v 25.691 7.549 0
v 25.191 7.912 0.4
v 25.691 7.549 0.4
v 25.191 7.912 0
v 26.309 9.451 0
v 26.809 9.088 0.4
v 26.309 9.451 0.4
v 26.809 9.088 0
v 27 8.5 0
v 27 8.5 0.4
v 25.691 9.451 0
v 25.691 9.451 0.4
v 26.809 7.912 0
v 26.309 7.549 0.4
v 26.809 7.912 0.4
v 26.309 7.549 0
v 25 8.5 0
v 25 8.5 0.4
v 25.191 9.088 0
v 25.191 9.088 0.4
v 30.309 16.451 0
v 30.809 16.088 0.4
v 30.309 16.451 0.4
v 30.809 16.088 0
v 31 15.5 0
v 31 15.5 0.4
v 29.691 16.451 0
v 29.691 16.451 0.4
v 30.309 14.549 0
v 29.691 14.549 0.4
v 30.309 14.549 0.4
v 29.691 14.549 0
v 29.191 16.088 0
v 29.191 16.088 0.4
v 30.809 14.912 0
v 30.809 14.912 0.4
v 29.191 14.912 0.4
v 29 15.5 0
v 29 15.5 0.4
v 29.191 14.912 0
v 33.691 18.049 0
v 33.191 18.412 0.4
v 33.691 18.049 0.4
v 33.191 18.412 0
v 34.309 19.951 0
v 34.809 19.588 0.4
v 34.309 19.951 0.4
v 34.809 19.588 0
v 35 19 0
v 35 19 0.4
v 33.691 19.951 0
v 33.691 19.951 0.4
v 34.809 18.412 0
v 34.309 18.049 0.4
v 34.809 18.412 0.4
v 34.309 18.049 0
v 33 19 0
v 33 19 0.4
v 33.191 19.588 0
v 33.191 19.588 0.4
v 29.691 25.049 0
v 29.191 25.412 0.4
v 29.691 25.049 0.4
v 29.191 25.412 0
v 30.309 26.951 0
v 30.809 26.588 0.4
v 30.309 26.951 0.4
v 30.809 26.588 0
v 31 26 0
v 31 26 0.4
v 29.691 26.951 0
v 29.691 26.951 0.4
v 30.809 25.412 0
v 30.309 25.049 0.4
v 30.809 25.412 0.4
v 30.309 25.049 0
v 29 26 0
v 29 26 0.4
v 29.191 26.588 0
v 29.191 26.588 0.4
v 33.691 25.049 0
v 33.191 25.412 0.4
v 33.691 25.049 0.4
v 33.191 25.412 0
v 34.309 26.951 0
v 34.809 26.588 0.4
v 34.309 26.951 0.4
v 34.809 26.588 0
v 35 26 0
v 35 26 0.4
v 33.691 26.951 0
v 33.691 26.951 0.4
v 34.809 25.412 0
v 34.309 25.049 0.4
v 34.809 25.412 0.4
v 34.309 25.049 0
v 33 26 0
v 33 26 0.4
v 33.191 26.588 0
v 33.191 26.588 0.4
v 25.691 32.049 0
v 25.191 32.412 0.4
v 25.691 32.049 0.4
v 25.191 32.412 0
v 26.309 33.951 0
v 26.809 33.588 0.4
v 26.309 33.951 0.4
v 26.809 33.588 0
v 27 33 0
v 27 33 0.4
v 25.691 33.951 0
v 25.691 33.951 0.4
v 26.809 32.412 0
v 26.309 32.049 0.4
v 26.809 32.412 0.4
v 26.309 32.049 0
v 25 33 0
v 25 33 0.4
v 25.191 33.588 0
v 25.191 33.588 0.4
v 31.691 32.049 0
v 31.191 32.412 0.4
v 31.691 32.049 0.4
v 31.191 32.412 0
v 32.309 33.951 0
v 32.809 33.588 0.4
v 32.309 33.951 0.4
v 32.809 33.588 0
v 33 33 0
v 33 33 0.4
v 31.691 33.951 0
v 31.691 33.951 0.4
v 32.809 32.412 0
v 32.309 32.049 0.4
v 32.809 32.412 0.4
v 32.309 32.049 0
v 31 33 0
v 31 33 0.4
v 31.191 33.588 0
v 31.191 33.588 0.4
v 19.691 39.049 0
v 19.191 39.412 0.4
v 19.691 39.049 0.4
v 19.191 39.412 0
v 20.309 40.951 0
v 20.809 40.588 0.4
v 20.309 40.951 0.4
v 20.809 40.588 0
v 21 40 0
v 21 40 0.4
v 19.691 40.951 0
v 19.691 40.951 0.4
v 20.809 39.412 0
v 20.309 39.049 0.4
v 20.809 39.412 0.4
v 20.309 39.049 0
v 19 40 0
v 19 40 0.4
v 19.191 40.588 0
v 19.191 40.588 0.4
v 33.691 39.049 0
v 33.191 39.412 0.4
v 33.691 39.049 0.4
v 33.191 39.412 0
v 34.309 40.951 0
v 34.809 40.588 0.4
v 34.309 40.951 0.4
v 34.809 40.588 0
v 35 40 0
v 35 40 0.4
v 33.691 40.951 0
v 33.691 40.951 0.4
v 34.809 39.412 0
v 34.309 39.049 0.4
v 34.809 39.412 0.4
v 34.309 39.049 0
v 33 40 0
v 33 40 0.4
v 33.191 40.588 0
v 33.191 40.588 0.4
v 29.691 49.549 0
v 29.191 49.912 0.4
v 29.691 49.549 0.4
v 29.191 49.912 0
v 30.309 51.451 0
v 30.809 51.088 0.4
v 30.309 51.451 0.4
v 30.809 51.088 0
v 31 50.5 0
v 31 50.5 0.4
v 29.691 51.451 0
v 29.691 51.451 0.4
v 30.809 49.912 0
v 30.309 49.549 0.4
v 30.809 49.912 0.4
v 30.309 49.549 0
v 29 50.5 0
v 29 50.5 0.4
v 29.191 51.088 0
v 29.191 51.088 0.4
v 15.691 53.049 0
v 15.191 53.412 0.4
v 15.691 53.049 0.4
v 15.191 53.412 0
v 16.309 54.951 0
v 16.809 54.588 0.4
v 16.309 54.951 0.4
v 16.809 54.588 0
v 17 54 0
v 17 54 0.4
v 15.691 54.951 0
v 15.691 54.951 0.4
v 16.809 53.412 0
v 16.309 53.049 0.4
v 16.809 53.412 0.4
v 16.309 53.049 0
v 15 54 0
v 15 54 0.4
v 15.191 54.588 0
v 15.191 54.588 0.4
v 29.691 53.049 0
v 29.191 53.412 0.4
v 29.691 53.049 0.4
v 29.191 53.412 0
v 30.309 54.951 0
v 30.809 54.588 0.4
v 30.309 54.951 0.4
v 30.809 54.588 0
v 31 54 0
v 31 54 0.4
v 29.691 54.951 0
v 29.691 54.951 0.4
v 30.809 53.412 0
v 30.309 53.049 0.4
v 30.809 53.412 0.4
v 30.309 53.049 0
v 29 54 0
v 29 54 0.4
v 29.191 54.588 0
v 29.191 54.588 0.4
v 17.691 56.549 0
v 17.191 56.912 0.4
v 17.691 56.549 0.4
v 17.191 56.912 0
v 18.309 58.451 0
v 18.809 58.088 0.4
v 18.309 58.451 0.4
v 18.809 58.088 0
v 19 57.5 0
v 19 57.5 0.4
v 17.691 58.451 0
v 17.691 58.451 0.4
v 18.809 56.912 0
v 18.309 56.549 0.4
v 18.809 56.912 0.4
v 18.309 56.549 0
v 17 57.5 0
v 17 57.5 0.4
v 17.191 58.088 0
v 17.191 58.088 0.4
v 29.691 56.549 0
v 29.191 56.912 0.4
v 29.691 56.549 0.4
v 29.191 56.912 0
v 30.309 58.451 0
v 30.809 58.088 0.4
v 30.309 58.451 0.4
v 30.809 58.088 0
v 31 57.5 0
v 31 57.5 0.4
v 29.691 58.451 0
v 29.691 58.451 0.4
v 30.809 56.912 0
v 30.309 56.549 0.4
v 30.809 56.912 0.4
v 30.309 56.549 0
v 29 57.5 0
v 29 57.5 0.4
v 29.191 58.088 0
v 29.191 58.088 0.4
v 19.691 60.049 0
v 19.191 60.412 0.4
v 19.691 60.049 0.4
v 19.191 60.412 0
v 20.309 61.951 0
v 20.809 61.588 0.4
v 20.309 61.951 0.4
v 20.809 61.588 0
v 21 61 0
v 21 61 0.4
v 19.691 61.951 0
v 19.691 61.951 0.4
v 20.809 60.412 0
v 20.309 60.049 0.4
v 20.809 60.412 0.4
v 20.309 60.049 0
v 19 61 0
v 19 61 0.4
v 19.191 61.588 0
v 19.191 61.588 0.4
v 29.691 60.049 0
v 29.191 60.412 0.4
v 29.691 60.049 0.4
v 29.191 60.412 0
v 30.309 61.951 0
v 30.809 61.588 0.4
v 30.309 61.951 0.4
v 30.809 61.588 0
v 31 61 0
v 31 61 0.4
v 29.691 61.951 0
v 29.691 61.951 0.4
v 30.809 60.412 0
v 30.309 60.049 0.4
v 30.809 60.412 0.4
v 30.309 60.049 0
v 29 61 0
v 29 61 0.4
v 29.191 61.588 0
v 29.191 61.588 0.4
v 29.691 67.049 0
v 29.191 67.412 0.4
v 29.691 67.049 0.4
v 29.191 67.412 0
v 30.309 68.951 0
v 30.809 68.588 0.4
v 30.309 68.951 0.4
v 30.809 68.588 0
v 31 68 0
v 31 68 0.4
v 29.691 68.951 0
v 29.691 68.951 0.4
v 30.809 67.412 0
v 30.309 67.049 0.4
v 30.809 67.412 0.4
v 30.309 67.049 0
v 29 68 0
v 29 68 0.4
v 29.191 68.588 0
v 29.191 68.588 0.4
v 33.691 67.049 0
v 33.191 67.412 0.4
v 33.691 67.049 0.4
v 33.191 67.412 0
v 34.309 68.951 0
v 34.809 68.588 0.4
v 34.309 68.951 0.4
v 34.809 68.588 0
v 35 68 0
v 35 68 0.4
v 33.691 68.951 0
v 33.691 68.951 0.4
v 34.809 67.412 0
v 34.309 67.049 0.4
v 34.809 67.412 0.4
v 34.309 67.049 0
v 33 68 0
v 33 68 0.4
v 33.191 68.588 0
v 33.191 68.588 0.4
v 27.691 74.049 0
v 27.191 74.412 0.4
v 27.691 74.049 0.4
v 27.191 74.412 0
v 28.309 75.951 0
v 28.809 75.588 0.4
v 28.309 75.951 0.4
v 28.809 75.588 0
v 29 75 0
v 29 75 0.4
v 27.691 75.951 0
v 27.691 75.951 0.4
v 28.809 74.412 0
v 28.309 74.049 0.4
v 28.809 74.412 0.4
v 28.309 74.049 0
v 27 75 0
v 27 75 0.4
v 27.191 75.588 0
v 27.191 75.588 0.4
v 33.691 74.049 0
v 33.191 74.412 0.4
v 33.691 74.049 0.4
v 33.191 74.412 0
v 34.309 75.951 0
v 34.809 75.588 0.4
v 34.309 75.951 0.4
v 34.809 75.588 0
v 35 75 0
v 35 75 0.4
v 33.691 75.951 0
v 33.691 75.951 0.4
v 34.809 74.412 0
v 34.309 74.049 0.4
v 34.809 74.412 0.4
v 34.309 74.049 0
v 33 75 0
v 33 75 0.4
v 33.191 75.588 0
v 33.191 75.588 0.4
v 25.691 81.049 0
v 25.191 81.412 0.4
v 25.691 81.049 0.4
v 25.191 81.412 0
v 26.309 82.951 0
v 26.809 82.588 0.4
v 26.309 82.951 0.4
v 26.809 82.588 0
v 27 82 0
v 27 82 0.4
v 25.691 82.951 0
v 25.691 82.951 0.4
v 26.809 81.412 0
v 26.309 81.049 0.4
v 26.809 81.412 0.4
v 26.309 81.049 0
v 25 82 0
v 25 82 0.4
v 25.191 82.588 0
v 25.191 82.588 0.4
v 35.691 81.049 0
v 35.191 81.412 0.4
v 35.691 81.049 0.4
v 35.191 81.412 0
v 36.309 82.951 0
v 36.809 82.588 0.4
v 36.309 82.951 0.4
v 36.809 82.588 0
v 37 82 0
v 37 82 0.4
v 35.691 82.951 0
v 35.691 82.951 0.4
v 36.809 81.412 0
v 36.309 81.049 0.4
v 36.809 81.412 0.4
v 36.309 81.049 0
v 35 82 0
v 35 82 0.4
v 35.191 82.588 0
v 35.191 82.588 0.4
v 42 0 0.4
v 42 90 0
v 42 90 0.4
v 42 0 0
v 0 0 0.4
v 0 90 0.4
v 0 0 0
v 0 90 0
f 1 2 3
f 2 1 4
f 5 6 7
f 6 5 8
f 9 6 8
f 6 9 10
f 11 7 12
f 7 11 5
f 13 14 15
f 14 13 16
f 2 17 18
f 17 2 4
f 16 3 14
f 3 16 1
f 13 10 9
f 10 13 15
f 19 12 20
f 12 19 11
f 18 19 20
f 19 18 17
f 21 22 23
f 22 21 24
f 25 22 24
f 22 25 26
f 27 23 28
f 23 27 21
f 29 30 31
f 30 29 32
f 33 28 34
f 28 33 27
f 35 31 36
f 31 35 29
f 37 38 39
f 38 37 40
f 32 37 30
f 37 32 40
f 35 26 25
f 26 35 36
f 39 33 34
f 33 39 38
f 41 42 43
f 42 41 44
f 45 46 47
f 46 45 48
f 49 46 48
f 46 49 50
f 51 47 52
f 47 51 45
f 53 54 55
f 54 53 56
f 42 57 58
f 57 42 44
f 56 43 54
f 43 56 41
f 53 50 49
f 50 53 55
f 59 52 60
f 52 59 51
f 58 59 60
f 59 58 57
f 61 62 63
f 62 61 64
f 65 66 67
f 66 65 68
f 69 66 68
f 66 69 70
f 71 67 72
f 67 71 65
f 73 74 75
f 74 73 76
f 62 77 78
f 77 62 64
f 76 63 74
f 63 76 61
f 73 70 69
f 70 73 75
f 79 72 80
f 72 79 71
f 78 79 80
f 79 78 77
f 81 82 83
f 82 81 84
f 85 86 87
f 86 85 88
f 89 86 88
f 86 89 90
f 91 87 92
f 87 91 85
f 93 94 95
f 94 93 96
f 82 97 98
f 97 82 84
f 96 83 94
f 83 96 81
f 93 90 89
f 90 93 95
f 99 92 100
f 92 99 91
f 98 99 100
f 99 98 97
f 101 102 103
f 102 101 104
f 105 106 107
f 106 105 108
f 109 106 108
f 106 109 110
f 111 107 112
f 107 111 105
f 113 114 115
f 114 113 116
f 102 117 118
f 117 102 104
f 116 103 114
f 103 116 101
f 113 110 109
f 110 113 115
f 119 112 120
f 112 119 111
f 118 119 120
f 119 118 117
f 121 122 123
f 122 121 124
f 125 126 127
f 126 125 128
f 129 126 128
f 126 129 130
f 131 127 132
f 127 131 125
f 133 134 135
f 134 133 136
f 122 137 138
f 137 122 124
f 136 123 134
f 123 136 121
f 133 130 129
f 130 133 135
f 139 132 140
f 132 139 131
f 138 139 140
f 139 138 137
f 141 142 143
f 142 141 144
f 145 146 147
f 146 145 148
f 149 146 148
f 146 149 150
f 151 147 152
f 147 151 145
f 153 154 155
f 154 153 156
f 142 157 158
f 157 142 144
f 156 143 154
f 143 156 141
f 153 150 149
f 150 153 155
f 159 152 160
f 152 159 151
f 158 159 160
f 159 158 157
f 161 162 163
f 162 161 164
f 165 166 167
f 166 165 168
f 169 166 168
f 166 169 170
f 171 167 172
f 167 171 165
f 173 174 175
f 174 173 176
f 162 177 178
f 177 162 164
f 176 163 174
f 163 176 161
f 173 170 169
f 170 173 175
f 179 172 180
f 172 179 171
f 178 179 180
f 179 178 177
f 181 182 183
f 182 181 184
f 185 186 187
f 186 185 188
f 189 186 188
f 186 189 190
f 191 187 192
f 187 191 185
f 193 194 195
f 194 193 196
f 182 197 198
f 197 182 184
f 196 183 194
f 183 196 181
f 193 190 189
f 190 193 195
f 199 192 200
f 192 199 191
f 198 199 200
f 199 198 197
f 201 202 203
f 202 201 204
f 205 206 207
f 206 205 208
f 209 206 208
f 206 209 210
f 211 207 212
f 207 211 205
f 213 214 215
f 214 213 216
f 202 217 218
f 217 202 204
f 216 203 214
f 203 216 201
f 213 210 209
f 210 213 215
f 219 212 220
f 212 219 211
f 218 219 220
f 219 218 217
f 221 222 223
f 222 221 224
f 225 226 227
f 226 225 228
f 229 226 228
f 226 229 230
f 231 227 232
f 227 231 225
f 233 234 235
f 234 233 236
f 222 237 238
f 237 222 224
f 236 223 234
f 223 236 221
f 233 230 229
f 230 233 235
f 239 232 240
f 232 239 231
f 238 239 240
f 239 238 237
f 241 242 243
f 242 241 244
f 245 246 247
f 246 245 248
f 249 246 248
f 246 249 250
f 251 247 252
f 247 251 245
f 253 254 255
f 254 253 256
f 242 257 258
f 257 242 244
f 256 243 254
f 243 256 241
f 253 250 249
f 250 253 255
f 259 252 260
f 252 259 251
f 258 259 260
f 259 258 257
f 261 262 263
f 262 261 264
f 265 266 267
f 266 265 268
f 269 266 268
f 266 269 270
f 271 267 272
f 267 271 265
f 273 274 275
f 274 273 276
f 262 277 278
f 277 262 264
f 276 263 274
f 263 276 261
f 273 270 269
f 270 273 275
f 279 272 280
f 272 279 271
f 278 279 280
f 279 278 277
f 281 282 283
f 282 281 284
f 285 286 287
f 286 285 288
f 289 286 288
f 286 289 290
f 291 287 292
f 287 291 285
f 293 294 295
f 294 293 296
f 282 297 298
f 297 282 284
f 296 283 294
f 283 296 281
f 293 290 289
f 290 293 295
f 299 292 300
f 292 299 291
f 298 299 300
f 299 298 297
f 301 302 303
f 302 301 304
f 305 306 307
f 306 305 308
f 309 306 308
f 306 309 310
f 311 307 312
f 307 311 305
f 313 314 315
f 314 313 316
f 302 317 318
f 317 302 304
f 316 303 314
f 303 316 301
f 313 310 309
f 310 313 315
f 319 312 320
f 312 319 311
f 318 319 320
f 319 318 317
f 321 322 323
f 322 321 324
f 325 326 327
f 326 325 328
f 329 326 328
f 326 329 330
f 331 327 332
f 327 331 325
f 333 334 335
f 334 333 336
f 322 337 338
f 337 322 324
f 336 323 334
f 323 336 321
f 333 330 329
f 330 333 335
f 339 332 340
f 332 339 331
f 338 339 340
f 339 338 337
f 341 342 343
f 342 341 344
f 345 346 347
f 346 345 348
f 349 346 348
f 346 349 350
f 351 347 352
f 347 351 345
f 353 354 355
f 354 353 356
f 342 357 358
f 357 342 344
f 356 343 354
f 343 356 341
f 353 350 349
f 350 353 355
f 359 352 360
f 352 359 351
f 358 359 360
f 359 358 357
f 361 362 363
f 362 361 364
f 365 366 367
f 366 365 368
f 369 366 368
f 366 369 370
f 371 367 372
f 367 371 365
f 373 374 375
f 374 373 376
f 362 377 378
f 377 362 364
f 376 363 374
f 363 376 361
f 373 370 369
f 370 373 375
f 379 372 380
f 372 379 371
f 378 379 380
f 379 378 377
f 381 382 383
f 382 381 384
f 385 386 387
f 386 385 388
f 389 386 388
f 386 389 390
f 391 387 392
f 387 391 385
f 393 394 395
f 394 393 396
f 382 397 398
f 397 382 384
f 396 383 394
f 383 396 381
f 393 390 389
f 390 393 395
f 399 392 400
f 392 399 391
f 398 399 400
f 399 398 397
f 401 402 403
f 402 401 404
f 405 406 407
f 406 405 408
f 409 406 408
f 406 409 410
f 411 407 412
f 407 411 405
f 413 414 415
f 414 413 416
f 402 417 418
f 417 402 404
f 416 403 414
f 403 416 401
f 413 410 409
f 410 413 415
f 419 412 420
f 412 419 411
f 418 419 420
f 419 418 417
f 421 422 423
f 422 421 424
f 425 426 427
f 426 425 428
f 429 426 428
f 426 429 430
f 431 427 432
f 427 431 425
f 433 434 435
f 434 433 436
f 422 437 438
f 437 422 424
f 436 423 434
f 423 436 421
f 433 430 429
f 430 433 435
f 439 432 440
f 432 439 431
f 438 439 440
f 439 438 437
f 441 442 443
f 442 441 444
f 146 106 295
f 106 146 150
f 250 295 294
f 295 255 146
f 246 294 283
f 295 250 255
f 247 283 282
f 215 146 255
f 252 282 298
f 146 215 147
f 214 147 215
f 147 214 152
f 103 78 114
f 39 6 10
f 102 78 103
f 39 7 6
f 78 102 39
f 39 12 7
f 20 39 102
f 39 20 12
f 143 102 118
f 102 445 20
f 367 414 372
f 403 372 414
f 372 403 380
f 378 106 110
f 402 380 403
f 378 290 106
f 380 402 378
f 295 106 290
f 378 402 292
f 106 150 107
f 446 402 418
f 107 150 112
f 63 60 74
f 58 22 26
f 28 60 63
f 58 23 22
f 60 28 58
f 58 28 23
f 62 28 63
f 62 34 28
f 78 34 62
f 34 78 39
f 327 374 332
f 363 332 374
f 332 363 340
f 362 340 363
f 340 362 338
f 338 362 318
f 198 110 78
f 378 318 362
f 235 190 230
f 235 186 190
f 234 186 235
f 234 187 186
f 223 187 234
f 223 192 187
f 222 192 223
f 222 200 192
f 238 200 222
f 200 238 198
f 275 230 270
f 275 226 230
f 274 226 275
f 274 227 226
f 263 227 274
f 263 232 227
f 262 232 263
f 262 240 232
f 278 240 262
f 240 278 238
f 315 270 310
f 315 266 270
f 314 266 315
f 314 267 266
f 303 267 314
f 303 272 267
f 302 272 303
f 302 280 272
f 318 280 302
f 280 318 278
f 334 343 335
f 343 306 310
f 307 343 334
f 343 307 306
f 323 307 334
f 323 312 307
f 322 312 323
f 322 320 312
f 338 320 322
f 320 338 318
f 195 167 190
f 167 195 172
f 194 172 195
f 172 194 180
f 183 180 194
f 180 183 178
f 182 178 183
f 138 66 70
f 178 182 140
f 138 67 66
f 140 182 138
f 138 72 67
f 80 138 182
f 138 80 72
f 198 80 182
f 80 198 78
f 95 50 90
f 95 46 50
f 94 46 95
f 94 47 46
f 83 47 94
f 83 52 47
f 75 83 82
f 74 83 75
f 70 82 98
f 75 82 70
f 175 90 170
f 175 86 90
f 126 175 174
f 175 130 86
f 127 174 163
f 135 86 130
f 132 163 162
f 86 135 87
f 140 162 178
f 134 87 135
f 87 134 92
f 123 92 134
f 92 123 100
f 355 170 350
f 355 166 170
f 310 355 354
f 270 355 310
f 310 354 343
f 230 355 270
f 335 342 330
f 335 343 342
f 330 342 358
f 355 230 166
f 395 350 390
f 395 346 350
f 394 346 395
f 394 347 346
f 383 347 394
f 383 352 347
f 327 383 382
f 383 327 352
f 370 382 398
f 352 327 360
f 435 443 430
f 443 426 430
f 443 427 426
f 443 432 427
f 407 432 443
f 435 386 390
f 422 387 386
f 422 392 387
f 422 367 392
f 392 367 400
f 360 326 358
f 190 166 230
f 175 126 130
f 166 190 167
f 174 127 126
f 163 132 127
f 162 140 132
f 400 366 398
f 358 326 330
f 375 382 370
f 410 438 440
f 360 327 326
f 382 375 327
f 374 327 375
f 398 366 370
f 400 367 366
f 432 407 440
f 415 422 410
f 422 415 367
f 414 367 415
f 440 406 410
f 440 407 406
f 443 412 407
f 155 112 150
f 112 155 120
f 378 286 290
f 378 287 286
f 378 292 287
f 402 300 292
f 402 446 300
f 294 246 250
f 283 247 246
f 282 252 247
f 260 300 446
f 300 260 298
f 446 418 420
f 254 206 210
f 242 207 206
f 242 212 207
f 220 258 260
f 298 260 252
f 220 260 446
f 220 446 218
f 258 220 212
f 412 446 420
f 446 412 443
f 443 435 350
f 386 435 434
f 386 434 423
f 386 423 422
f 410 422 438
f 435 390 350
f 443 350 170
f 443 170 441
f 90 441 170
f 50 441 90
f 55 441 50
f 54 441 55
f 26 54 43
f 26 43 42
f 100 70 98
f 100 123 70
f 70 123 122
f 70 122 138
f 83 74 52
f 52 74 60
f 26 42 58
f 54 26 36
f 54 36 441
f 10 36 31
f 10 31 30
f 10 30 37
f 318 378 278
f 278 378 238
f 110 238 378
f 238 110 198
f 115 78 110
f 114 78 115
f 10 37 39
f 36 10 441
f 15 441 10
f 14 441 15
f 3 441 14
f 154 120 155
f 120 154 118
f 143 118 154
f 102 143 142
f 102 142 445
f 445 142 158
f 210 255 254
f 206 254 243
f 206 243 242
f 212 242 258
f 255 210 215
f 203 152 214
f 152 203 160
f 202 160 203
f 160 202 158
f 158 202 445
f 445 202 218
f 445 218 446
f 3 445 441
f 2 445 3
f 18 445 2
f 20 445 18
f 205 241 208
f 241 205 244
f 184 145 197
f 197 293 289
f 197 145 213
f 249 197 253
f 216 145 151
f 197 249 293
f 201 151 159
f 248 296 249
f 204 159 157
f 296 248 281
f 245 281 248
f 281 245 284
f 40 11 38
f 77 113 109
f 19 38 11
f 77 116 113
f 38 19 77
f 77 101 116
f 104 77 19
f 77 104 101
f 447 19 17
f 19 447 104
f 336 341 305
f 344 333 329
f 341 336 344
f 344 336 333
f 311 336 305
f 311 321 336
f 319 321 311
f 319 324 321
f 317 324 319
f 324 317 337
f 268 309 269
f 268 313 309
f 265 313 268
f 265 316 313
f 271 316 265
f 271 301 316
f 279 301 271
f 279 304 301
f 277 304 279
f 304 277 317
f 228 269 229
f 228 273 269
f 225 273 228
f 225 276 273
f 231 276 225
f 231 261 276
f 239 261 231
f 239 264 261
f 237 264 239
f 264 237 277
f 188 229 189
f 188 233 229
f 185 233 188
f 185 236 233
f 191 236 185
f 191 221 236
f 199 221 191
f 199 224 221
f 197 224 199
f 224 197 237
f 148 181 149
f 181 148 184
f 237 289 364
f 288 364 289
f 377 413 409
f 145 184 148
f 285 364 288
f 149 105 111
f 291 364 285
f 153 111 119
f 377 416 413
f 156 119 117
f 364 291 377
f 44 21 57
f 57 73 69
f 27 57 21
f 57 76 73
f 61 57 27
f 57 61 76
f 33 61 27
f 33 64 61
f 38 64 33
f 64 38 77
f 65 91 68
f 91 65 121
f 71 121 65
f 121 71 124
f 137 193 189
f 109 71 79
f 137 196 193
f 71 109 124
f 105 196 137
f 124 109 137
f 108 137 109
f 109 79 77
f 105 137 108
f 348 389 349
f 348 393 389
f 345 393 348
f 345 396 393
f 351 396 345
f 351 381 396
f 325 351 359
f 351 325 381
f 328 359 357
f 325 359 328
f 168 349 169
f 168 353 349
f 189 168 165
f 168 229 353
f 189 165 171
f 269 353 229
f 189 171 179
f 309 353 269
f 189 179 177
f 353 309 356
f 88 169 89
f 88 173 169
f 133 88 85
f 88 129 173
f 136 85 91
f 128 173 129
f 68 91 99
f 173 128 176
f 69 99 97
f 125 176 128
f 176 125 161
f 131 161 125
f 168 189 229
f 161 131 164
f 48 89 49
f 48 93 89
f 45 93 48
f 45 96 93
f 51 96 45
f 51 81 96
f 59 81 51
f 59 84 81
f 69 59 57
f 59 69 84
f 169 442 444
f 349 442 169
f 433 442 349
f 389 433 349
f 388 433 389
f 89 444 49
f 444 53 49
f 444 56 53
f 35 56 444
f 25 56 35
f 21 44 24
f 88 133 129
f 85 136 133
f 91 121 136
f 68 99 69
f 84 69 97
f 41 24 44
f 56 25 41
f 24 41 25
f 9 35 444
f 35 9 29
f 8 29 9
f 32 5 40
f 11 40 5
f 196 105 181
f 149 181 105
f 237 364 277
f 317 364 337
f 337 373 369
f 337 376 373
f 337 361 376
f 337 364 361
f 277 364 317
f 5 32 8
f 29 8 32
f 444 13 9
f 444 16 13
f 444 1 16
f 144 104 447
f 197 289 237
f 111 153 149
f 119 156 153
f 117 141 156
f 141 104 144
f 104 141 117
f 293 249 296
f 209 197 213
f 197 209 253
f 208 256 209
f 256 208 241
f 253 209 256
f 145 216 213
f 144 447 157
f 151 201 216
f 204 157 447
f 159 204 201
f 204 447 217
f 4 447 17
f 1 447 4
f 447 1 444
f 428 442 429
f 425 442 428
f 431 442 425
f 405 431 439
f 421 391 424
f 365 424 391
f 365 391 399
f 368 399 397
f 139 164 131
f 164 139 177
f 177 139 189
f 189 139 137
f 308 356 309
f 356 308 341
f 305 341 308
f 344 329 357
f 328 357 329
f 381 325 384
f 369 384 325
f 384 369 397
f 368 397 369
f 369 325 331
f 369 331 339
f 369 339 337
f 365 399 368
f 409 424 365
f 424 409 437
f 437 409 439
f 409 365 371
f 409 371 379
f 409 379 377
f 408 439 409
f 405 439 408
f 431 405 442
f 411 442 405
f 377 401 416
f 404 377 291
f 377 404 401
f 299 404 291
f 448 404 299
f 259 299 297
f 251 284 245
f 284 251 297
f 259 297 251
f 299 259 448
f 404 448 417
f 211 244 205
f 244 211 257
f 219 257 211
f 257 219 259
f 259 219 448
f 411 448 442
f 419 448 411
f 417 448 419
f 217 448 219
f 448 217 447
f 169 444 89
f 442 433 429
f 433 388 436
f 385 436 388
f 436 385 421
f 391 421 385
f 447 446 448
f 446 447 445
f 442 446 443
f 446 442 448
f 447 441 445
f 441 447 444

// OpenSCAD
$fn=10*1;  //More polygons

//Defines whether a pre-defined song or the NoteString shall be used.
SongPicker = "Star-Spangled Banner"; // [Note-String,Star-Spangled Banner]

//Defines where to set the holes for the notes. You have the notes c1 to c3. The first two characters define the note (c1,d1,e1...b1,c2,...c3), the last two characters define the beat. You have 50 beats to use. After every note-definition place a |. One c1 on the third beat would result in this NoteString: "c103|". Don't forget the | at the end!
NoteString = "c101|d102|e103|f104|g105|a106|b107|c208|d209|e210|f211|g212|a213|b214|c315|";

//The layer-thickness must not be more then 0.4mm. Otherwise it won't fit into the music box! Also try to print at least two layers - so slice it with a layer height of 0.2mm.
LayerThickness = 0.4;

//Defines the width of the stripe (in mm).
StripeWidth = 42; // [30:50]

//Defines the length of the stripe. 15 beats need a length around 60mm. The full 50 beats would need 200mm.
StripeLength = 90;// [10:200]

//For fine-tuning only: defines how far the c1 is away from the left stripe-border (in mm).
MarginLeft = 5; // [2:10]

//For fine-tuning only: defines the distance between the beats.
BeatDistance = 3.5;

//For fine-tuning only: defines the distance between the beats.
ToneDistance = 2;

Start( );

module Start()
{
NoteString_AmericanAnthem = "a101|f103|d104|f106|d106|a108|e108|d210|d110|f113|f214|f114|e215|f115|d216|f116|f118|d118|g120|d120|a122|c122|";

if( SongPicker == "Star-Spangled Banner")
	BuildStripe(NoteString_AmericanAnthem);
else if (SongPicker == "Note-String")
	BuildStripe(NoteString);
}

module BuildStripe(NoteStringLocal){
	takte=search("|",NoteStringLocal,1000)[0];
	difference()
	{
		BuildBase();
		for(i=[0:len(takte)-1])
		{
			printNote(str(NoteStringLocal[takte[i]-2],NoteStringLocal[takte[i]-1]), str(NoteStringLocal[takte[i]-4],NoteStringLocal[takte[i]-3]));
		}
	}
}

module printNote(takt,note)
{
	//I did not find a way to convert the string "01" into the number 1.
	//So there is this ugly convertion, I'm sorry. ;)
	if (takt == "01")
		printNote2(1,note);
	else if (takt == "02")
		printNote2(2,note);
	else if (takt == "03")
		printNote2(3,note);
	else if (takt == "04")
		printNote2(4,note);
	else if (takt == "05")
		printNote2(5,note);
	else if (takt == "06")
		printNote2(6,note);
	else if (takt == "07")
		printNote2(7,note);
	else if (takt == "08")
		printNote2(8,note);
	else if (takt == "09")
		printNote2(9,note);
	else if (takt == "10")
		printNote2(10,note);
	else if (takt == "11")
		printNote2(11,note);
	else if (takt == "12")
		printNote2(12,note);
	else if (takt == "13")
		printNote2(13,note);
	else if (takt == "14")
		printNote2(14,note);
	else if (takt == "15")
		printNote2(15,note);
	else if (takt == "16")
		printNote2(16,note);
	else if (takt == "17")
		printNote2(17,note);
	else if (takt == "18")
		printNote2(18,note);
	else if (takt == "19")
		printNote2(19,note);
	else if (takt == "20")
		printNote2(20,note);
	else if (takt == "21")
		printNote2(21,note);
	else if (takt == "22")
		printNote2(22,note);
	else if (takt == "23")
		printNote2(23,note);
	else if (takt == "24")
		printNote2(24,note);
	else if (takt == "25")
		printNote2(25,note);
	else if (takt == "26")
		printNote2(26,note);
	else if (takt == "27")
		printNote2(27,note);
	else if (takt == "28")
		printNote2(28,note);
	else if (takt == "29")
		printNote2(29,note);
	else if (takt == "30")
		printNote2(30,note);
	else if (takt == "31")
		printNote2(31,note);
	else if (takt == "32")
		printNote2(32,note);
	else if (takt == "33")
		printNote2(33,note);
	else if (takt == "34")
		printNote2(34,note);
	else if (takt == "35")
		printNote2(35,note);
	else if (takt == "36")
		printNote2(36,note);
	else if (takt == "37")
		printNote2(37,note);
	else if (takt == "38")
		printNote2(38,note);
	else if (takt == "39")
		printNote2(39,note);
	else if (takt == "40")
		printNote2(40,note);
	else if (takt == "41")
		printNote2(41,note);
	else if (takt == "42")
		printNote2(42,note);
	else if (takt == "43")
		printNote2(43,note);
	else if (takt == "44")
		printNote2(44,note);
	else if (takt == "45")
		printNote2(45,note);
	else if (takt == "46")
		printNote2(46,note);
	else if (takt == "47")
		printNote2(47,note);
	else if (takt == "48")
		printNote2(48,note);
	else if (takt == "49")
		printNote2(49,note);
	else if (takt == "50")
		printNote2(50,note);
	else
		printNote2(10,note);
}

module printNote2(takt,note)
{
	if (note == "c1")
		MakeHole(takt,1);
	else if (note == "d1")
		MakeHole(takt,2);
	else if (note == "e1")
		MakeHole(takt,3);
	else if (note == "f1")
		MakeHole(takt,4);
	else if (note == "g1")
		MakeHole(takt,5);
	else if (note == "a1")
		MakeHole(takt,6);
	else if (note == "b1") //h
		MakeHole(takt,7);
	else if (note == "c2")
		MakeHole(takt,8);
	else if (note == "d2")
		MakeHole(takt,9);
	else if (note == "e2")
		MakeHole(takt,10);
	else if (note == "f2")
		MakeHole(takt,11);
	else if (note == "g2")
		MakeHole(takt,12);
	else if (note == "a2")
		MakeHole(takt,13);
	else if (note == "b2") //h
		MakeHole(takt,14);
	else if (note == "c3")
		MakeHole(takt,15);
}

module BuildBase(){
	cube([StripeWidth,StripeLength,LayerThickness]);
}

module MakeHole(beatNumber,pitchNumber){
	Y = MarginLeft + (beatNumber * BeatDistance);
	X = StripeWidth - MarginLeft - (pitchNumber * ToneDistance) + 1;

	translate([X,Y,-1]) cylinder(h=LayerThickness*20,r=1);
}
